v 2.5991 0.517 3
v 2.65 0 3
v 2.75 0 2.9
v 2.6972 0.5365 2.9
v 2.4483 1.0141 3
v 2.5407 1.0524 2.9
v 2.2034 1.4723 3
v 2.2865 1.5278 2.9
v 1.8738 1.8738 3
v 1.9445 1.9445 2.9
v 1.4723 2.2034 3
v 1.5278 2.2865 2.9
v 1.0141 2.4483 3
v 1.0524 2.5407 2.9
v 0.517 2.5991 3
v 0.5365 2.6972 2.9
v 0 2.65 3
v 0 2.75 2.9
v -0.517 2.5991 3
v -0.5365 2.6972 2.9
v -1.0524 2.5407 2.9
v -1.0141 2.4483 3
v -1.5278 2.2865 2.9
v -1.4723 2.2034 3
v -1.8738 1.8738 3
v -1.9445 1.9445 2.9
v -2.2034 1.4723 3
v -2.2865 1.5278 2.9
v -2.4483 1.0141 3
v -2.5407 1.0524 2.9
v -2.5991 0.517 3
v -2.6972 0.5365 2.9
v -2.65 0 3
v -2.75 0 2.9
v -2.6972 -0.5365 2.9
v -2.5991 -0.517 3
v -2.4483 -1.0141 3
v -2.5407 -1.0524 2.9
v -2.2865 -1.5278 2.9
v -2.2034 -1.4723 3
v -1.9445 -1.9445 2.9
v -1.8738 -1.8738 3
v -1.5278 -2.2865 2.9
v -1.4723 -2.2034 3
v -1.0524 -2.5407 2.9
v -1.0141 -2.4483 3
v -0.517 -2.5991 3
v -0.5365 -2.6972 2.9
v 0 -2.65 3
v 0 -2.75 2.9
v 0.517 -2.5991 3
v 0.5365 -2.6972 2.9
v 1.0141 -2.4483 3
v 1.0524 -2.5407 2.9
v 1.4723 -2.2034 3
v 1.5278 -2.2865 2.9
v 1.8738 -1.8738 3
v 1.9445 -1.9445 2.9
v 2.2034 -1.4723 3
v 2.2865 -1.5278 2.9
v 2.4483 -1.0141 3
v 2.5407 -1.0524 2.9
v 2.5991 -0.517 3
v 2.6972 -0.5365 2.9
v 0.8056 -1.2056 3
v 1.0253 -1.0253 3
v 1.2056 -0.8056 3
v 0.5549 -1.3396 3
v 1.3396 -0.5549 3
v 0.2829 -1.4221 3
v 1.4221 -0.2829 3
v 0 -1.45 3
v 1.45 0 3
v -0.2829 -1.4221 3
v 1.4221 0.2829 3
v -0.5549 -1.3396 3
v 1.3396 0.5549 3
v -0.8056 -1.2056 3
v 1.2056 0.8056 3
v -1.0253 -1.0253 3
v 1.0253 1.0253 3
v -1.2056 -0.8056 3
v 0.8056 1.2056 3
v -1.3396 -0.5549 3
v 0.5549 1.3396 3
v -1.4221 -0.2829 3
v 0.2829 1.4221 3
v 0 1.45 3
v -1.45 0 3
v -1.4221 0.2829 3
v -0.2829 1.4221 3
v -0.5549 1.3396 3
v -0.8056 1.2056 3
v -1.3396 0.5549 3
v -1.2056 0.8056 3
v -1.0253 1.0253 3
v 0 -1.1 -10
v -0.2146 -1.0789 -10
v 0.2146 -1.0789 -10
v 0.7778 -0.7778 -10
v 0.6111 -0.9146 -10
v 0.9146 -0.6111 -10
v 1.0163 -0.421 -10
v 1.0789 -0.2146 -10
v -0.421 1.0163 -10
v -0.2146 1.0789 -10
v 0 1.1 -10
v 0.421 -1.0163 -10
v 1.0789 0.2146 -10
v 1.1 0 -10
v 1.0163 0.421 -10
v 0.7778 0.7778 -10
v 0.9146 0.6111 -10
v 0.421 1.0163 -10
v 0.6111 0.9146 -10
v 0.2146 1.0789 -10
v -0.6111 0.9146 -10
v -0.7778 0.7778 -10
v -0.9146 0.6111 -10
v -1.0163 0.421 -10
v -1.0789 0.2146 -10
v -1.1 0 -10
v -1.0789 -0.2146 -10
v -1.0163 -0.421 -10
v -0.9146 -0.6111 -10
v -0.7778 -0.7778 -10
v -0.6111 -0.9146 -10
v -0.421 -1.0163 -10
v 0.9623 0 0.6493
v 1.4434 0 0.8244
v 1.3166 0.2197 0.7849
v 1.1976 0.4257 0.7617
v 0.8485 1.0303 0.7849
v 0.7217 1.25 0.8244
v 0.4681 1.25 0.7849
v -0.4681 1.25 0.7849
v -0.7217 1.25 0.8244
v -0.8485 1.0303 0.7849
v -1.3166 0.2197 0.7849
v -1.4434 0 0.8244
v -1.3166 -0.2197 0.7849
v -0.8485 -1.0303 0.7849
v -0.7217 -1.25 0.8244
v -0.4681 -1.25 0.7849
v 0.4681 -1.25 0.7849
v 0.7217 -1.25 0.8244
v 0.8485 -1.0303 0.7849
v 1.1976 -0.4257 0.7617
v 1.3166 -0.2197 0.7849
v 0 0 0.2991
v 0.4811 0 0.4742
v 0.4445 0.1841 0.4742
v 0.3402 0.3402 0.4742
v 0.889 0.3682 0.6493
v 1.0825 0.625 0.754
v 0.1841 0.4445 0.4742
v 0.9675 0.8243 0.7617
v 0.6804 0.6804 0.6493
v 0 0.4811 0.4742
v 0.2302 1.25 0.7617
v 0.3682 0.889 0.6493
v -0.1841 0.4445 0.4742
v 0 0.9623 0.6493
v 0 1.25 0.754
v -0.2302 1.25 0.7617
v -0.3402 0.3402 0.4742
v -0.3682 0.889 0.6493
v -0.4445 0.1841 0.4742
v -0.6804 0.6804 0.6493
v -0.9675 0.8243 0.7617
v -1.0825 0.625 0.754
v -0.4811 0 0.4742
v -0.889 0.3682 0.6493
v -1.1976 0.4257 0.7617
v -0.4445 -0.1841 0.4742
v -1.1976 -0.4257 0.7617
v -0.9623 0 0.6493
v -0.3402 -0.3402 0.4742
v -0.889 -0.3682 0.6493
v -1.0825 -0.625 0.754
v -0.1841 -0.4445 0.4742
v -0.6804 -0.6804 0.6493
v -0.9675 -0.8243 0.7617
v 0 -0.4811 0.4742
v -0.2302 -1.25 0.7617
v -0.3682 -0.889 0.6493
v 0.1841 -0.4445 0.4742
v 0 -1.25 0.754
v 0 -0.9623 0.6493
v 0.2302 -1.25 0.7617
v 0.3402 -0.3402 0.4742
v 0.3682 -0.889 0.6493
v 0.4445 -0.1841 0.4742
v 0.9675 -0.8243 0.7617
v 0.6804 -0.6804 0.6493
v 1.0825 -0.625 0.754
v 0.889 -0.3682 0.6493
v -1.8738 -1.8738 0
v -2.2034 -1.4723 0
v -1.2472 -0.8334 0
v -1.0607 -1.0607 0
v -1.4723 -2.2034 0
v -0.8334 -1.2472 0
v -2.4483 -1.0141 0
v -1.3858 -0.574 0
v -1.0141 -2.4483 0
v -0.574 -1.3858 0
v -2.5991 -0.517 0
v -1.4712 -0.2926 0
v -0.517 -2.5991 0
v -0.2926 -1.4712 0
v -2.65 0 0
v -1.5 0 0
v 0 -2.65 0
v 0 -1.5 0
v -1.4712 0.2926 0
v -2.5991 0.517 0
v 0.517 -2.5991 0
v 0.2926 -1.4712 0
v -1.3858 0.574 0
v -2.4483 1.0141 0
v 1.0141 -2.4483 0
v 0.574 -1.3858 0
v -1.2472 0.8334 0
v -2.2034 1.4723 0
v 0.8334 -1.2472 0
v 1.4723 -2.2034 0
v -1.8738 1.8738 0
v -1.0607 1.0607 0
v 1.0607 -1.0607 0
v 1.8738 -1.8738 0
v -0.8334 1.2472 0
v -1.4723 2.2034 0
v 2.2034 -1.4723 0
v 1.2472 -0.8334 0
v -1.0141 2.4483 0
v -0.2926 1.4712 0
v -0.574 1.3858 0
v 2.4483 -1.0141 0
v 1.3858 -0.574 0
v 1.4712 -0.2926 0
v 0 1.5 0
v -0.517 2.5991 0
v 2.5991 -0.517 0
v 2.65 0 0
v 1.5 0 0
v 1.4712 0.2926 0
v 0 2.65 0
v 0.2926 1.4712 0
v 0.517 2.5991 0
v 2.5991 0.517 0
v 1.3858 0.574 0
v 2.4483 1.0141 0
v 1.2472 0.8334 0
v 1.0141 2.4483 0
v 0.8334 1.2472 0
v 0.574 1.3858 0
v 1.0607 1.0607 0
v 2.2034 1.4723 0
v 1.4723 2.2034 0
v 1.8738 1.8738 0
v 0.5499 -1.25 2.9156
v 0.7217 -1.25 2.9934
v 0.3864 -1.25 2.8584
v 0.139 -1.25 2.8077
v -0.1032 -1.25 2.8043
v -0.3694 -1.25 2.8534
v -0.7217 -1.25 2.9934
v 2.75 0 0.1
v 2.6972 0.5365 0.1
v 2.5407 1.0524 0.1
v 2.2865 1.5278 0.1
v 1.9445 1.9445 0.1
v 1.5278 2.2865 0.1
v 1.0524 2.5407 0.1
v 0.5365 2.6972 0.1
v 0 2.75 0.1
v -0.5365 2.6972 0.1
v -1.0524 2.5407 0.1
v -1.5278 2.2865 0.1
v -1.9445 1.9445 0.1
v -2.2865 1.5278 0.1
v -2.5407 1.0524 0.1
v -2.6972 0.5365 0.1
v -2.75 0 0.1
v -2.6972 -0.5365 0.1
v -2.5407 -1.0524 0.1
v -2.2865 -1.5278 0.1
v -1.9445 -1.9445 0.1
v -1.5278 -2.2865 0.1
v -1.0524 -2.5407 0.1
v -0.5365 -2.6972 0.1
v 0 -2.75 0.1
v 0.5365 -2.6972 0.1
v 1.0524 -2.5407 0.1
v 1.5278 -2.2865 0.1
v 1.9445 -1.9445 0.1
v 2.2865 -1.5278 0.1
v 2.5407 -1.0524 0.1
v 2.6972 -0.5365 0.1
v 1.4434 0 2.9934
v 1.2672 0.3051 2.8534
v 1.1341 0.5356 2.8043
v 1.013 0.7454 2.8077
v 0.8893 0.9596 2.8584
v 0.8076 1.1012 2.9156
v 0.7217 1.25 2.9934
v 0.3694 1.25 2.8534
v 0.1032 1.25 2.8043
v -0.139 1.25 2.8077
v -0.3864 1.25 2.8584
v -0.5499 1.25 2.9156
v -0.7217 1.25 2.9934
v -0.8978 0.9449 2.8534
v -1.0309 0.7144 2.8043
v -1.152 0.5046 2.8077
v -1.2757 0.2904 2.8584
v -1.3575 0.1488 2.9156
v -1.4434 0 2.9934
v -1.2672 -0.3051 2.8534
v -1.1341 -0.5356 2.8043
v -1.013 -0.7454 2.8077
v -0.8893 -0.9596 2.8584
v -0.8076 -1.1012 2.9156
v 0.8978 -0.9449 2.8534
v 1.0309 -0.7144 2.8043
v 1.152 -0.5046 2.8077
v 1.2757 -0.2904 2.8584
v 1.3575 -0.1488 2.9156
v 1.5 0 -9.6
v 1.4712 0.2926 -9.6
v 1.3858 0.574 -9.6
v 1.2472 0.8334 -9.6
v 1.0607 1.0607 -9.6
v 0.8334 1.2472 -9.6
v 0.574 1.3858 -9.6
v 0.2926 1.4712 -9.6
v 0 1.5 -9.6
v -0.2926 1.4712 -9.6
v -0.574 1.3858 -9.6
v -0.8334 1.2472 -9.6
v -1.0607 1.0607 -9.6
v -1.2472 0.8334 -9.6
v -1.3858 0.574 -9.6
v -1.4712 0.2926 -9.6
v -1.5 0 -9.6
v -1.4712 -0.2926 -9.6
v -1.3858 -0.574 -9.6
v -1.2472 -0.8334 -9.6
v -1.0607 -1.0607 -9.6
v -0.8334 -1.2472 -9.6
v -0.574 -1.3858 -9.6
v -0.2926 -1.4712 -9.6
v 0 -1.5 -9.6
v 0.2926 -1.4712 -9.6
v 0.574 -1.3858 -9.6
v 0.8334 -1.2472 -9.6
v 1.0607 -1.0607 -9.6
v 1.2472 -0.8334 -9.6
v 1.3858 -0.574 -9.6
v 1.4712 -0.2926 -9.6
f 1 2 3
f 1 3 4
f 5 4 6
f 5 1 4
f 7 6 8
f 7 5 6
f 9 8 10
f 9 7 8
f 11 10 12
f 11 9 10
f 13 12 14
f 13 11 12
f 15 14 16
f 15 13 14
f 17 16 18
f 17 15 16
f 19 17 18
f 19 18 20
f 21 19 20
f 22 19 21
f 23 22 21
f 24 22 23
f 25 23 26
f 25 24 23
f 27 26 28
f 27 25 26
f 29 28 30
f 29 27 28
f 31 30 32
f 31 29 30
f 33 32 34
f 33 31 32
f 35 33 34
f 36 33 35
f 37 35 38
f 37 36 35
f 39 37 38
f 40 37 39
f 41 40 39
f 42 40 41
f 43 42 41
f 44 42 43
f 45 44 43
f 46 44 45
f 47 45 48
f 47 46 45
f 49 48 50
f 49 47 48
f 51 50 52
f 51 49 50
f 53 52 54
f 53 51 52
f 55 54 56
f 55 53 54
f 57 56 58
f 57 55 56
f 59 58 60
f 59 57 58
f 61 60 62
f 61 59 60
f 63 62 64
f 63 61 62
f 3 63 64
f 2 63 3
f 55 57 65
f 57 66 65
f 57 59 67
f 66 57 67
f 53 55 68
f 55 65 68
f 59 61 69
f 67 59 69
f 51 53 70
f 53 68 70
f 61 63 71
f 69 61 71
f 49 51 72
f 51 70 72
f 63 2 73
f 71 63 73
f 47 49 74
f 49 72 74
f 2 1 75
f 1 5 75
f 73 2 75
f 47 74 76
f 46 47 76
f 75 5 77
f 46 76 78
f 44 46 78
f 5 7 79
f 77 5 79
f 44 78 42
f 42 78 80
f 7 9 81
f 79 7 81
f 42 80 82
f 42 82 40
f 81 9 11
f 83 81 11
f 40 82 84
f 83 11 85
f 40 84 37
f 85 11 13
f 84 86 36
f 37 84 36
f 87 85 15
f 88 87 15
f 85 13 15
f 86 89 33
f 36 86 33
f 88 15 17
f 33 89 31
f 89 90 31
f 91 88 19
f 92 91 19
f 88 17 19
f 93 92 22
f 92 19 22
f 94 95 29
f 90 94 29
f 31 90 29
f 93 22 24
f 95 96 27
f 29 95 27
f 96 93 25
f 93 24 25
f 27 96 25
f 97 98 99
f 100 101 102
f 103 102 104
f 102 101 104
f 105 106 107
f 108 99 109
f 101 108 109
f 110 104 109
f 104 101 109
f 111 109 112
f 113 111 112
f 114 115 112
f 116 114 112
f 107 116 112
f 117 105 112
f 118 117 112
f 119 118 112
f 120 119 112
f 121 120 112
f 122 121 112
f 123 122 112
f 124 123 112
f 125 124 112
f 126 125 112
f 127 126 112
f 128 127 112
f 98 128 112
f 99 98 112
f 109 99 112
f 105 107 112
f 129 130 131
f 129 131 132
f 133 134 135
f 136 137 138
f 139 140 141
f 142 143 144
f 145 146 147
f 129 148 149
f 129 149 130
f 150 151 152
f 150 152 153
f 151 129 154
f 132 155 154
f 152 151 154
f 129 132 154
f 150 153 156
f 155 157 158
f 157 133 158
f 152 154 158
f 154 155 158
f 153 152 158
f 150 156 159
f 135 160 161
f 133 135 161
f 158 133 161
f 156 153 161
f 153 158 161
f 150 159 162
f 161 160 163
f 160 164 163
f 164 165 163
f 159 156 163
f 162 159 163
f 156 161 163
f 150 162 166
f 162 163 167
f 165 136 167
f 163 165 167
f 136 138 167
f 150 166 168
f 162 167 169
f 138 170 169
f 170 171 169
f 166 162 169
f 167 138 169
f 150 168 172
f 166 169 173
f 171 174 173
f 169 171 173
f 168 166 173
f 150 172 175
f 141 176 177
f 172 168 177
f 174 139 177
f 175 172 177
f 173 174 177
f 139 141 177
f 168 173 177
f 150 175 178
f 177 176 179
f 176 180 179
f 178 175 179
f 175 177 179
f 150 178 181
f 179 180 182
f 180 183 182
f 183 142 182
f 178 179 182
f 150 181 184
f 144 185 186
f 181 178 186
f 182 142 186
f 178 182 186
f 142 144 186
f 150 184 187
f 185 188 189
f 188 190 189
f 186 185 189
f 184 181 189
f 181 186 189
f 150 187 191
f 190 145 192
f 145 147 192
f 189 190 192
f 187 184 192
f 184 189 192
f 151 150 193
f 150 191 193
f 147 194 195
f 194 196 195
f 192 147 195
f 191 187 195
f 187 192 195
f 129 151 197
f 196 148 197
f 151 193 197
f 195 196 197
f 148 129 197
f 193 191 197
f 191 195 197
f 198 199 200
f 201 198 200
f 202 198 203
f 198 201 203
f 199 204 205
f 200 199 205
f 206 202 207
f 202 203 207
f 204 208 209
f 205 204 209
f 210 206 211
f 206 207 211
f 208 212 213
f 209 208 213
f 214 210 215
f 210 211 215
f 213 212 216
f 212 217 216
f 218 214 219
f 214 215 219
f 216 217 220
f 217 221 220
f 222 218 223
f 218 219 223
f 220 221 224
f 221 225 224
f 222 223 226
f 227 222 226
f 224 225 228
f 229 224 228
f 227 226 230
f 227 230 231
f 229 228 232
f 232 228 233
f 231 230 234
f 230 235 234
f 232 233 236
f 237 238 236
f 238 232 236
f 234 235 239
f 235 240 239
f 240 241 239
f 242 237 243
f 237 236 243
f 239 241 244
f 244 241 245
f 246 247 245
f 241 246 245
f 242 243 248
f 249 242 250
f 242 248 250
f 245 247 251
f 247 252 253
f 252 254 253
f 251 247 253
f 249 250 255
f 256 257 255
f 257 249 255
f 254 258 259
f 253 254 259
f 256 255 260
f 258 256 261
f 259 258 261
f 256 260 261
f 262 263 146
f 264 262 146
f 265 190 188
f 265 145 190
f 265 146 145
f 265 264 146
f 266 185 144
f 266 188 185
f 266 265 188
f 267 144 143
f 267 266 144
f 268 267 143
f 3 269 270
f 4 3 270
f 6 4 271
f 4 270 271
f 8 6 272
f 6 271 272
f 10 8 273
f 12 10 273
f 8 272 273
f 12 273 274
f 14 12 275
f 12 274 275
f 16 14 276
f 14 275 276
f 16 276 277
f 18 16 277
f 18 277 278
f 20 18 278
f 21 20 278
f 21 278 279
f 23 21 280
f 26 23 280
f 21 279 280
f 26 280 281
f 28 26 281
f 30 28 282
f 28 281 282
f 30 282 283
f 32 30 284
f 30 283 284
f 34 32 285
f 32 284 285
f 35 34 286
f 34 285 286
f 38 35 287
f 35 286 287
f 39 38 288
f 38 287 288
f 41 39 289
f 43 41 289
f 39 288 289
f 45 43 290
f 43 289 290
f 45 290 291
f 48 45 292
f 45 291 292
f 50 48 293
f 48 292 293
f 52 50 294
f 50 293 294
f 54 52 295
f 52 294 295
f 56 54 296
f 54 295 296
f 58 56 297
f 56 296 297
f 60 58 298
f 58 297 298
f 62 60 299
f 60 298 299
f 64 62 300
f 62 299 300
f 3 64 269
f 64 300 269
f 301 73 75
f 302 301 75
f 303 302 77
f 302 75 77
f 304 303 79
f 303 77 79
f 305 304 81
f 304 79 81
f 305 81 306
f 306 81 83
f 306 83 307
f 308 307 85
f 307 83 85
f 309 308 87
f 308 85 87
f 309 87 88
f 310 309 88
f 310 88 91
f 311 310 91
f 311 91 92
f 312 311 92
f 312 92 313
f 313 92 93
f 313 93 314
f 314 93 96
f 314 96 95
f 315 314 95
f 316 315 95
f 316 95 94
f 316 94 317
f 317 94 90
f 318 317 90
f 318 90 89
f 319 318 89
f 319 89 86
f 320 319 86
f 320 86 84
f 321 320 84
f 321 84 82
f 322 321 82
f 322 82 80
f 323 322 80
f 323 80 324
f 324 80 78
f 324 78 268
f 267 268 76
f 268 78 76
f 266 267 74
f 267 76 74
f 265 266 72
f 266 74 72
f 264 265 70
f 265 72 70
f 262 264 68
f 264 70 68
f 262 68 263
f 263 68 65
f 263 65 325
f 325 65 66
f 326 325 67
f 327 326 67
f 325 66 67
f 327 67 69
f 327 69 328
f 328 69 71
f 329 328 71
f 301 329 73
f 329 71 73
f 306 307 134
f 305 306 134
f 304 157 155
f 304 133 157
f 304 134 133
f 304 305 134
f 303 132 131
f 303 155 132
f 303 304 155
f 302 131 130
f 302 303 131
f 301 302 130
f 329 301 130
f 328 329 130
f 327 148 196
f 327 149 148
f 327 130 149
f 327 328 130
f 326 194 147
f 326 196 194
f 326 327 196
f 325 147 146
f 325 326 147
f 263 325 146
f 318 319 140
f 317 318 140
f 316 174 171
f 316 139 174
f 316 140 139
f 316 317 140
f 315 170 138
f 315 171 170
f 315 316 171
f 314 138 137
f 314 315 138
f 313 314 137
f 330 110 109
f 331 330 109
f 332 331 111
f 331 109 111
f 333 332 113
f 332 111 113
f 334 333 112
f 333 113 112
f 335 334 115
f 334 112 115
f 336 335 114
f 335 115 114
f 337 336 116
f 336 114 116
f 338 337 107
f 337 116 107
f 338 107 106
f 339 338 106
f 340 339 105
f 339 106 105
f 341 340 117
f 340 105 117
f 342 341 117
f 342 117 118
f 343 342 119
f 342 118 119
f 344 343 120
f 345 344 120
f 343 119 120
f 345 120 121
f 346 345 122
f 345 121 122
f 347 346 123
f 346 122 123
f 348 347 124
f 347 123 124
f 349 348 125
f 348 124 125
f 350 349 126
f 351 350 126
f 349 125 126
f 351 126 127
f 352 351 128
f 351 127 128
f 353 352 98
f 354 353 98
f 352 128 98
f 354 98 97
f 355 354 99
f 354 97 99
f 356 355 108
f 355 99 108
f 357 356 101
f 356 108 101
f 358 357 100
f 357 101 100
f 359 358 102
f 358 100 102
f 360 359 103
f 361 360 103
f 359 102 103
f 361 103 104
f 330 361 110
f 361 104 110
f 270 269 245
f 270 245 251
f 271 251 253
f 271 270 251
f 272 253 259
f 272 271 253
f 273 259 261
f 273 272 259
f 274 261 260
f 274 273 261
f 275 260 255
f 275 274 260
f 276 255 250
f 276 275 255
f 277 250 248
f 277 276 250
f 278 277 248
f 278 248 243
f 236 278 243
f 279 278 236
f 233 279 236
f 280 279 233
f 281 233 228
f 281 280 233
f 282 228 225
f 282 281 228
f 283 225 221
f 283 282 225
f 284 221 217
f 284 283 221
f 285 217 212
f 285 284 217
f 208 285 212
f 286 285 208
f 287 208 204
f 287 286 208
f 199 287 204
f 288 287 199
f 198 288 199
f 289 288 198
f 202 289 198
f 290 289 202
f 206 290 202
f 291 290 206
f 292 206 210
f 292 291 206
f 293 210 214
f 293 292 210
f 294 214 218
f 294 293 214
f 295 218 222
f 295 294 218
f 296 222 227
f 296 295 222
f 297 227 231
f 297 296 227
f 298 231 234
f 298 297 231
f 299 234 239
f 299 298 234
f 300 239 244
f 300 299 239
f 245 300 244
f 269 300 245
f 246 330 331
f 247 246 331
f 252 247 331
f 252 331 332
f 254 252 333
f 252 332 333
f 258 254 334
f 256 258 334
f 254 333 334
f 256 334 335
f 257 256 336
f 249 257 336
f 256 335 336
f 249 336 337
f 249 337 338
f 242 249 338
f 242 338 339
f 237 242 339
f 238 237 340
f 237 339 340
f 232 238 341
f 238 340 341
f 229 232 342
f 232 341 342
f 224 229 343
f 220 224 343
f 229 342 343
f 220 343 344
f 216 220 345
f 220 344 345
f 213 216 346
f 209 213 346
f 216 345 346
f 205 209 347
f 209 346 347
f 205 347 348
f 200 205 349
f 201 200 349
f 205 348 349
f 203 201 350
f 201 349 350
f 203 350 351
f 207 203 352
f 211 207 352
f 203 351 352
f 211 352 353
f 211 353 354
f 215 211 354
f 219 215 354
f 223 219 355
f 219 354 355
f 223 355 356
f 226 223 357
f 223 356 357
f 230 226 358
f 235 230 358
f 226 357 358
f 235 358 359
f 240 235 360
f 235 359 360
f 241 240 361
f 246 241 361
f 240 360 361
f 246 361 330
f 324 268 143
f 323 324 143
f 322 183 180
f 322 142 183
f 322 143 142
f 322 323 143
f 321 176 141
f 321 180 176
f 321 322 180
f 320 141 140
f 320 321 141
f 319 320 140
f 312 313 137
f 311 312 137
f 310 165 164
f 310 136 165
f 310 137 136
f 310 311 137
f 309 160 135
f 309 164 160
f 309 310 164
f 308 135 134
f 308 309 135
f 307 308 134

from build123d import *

# Parameters (mm, degrees)
SKETCH034_R     = 3.75
POCKET013_DEPTH = 9.70192
CHAMFER013_SIZE = 0.4
CHAMFER014_SIZE = 0.1


with BuildPart() as pocket013:
    # Sketch035 → Revolution005 (revolve)
    with BuildSketch(Plane.XZ):
        Polygon((0, 0.29908), (2.75, 1.3), (2.75, 10), (0, 10), align=None)
    revolve(axis=Axis((0, 0, 0), (0, 0, 1)))

    # Sketch034 (on Face3 of Revolution005) → Pocket013 (cut, through all)
    with BuildSketch(Plane(origin=(0, 0, 10), x_dir=(-1, 0, 0), z_dir=(0, 0, 1))):
        Circle(SKETCH034_R)
        Polygon((-0.721688, 1.25), (0.721688, 1.25), (1.443376, 0), (0.721688, -1.25), (-0.721688, -1.25), (-1.443376, 0), align=None, mode=Mode.SUBTRACT)
    extrude(amount=-POCKET013_DEPTH, mode=Mode.SUBTRACT)


with BuildPart() as chamfer014:
    # Sketch033 → Revolution004 (revolve)
    with BuildSketch(Plane.XZ):
        Polygon((1.45, 3), (2.75, 3), (2.75, 0), (1.5, 0), (1.5, -10), (0, -10), (0, 1.549999), align=None)
    revolve(axis=Axis((0, 0, 0), (0, 0, 1)))

    # Cut005: cut Pocket013
    add(pocket013.part, mode=Mode.SUBTRACT)

    # Chamfer013
    chamfer013_edges = [chamfer014.edges().sort_by_distance(p)[0] for p in [
        (-1.5, 0, -10),
    ]]
    chamfer(chamfer013_edges, length=CHAMFER013_SIZE)

    # Chamfer014
    chamfer014_edges = [chamfer014.edges().sort_by_distance(p)[0] for p in [
        (-2.75, 0, 0),
        (-2.75, 0, 3),
    ]]
    chamfer(chamfer014_edges, length=CHAMFER014_SIZE)


solid = chamfer014.part
